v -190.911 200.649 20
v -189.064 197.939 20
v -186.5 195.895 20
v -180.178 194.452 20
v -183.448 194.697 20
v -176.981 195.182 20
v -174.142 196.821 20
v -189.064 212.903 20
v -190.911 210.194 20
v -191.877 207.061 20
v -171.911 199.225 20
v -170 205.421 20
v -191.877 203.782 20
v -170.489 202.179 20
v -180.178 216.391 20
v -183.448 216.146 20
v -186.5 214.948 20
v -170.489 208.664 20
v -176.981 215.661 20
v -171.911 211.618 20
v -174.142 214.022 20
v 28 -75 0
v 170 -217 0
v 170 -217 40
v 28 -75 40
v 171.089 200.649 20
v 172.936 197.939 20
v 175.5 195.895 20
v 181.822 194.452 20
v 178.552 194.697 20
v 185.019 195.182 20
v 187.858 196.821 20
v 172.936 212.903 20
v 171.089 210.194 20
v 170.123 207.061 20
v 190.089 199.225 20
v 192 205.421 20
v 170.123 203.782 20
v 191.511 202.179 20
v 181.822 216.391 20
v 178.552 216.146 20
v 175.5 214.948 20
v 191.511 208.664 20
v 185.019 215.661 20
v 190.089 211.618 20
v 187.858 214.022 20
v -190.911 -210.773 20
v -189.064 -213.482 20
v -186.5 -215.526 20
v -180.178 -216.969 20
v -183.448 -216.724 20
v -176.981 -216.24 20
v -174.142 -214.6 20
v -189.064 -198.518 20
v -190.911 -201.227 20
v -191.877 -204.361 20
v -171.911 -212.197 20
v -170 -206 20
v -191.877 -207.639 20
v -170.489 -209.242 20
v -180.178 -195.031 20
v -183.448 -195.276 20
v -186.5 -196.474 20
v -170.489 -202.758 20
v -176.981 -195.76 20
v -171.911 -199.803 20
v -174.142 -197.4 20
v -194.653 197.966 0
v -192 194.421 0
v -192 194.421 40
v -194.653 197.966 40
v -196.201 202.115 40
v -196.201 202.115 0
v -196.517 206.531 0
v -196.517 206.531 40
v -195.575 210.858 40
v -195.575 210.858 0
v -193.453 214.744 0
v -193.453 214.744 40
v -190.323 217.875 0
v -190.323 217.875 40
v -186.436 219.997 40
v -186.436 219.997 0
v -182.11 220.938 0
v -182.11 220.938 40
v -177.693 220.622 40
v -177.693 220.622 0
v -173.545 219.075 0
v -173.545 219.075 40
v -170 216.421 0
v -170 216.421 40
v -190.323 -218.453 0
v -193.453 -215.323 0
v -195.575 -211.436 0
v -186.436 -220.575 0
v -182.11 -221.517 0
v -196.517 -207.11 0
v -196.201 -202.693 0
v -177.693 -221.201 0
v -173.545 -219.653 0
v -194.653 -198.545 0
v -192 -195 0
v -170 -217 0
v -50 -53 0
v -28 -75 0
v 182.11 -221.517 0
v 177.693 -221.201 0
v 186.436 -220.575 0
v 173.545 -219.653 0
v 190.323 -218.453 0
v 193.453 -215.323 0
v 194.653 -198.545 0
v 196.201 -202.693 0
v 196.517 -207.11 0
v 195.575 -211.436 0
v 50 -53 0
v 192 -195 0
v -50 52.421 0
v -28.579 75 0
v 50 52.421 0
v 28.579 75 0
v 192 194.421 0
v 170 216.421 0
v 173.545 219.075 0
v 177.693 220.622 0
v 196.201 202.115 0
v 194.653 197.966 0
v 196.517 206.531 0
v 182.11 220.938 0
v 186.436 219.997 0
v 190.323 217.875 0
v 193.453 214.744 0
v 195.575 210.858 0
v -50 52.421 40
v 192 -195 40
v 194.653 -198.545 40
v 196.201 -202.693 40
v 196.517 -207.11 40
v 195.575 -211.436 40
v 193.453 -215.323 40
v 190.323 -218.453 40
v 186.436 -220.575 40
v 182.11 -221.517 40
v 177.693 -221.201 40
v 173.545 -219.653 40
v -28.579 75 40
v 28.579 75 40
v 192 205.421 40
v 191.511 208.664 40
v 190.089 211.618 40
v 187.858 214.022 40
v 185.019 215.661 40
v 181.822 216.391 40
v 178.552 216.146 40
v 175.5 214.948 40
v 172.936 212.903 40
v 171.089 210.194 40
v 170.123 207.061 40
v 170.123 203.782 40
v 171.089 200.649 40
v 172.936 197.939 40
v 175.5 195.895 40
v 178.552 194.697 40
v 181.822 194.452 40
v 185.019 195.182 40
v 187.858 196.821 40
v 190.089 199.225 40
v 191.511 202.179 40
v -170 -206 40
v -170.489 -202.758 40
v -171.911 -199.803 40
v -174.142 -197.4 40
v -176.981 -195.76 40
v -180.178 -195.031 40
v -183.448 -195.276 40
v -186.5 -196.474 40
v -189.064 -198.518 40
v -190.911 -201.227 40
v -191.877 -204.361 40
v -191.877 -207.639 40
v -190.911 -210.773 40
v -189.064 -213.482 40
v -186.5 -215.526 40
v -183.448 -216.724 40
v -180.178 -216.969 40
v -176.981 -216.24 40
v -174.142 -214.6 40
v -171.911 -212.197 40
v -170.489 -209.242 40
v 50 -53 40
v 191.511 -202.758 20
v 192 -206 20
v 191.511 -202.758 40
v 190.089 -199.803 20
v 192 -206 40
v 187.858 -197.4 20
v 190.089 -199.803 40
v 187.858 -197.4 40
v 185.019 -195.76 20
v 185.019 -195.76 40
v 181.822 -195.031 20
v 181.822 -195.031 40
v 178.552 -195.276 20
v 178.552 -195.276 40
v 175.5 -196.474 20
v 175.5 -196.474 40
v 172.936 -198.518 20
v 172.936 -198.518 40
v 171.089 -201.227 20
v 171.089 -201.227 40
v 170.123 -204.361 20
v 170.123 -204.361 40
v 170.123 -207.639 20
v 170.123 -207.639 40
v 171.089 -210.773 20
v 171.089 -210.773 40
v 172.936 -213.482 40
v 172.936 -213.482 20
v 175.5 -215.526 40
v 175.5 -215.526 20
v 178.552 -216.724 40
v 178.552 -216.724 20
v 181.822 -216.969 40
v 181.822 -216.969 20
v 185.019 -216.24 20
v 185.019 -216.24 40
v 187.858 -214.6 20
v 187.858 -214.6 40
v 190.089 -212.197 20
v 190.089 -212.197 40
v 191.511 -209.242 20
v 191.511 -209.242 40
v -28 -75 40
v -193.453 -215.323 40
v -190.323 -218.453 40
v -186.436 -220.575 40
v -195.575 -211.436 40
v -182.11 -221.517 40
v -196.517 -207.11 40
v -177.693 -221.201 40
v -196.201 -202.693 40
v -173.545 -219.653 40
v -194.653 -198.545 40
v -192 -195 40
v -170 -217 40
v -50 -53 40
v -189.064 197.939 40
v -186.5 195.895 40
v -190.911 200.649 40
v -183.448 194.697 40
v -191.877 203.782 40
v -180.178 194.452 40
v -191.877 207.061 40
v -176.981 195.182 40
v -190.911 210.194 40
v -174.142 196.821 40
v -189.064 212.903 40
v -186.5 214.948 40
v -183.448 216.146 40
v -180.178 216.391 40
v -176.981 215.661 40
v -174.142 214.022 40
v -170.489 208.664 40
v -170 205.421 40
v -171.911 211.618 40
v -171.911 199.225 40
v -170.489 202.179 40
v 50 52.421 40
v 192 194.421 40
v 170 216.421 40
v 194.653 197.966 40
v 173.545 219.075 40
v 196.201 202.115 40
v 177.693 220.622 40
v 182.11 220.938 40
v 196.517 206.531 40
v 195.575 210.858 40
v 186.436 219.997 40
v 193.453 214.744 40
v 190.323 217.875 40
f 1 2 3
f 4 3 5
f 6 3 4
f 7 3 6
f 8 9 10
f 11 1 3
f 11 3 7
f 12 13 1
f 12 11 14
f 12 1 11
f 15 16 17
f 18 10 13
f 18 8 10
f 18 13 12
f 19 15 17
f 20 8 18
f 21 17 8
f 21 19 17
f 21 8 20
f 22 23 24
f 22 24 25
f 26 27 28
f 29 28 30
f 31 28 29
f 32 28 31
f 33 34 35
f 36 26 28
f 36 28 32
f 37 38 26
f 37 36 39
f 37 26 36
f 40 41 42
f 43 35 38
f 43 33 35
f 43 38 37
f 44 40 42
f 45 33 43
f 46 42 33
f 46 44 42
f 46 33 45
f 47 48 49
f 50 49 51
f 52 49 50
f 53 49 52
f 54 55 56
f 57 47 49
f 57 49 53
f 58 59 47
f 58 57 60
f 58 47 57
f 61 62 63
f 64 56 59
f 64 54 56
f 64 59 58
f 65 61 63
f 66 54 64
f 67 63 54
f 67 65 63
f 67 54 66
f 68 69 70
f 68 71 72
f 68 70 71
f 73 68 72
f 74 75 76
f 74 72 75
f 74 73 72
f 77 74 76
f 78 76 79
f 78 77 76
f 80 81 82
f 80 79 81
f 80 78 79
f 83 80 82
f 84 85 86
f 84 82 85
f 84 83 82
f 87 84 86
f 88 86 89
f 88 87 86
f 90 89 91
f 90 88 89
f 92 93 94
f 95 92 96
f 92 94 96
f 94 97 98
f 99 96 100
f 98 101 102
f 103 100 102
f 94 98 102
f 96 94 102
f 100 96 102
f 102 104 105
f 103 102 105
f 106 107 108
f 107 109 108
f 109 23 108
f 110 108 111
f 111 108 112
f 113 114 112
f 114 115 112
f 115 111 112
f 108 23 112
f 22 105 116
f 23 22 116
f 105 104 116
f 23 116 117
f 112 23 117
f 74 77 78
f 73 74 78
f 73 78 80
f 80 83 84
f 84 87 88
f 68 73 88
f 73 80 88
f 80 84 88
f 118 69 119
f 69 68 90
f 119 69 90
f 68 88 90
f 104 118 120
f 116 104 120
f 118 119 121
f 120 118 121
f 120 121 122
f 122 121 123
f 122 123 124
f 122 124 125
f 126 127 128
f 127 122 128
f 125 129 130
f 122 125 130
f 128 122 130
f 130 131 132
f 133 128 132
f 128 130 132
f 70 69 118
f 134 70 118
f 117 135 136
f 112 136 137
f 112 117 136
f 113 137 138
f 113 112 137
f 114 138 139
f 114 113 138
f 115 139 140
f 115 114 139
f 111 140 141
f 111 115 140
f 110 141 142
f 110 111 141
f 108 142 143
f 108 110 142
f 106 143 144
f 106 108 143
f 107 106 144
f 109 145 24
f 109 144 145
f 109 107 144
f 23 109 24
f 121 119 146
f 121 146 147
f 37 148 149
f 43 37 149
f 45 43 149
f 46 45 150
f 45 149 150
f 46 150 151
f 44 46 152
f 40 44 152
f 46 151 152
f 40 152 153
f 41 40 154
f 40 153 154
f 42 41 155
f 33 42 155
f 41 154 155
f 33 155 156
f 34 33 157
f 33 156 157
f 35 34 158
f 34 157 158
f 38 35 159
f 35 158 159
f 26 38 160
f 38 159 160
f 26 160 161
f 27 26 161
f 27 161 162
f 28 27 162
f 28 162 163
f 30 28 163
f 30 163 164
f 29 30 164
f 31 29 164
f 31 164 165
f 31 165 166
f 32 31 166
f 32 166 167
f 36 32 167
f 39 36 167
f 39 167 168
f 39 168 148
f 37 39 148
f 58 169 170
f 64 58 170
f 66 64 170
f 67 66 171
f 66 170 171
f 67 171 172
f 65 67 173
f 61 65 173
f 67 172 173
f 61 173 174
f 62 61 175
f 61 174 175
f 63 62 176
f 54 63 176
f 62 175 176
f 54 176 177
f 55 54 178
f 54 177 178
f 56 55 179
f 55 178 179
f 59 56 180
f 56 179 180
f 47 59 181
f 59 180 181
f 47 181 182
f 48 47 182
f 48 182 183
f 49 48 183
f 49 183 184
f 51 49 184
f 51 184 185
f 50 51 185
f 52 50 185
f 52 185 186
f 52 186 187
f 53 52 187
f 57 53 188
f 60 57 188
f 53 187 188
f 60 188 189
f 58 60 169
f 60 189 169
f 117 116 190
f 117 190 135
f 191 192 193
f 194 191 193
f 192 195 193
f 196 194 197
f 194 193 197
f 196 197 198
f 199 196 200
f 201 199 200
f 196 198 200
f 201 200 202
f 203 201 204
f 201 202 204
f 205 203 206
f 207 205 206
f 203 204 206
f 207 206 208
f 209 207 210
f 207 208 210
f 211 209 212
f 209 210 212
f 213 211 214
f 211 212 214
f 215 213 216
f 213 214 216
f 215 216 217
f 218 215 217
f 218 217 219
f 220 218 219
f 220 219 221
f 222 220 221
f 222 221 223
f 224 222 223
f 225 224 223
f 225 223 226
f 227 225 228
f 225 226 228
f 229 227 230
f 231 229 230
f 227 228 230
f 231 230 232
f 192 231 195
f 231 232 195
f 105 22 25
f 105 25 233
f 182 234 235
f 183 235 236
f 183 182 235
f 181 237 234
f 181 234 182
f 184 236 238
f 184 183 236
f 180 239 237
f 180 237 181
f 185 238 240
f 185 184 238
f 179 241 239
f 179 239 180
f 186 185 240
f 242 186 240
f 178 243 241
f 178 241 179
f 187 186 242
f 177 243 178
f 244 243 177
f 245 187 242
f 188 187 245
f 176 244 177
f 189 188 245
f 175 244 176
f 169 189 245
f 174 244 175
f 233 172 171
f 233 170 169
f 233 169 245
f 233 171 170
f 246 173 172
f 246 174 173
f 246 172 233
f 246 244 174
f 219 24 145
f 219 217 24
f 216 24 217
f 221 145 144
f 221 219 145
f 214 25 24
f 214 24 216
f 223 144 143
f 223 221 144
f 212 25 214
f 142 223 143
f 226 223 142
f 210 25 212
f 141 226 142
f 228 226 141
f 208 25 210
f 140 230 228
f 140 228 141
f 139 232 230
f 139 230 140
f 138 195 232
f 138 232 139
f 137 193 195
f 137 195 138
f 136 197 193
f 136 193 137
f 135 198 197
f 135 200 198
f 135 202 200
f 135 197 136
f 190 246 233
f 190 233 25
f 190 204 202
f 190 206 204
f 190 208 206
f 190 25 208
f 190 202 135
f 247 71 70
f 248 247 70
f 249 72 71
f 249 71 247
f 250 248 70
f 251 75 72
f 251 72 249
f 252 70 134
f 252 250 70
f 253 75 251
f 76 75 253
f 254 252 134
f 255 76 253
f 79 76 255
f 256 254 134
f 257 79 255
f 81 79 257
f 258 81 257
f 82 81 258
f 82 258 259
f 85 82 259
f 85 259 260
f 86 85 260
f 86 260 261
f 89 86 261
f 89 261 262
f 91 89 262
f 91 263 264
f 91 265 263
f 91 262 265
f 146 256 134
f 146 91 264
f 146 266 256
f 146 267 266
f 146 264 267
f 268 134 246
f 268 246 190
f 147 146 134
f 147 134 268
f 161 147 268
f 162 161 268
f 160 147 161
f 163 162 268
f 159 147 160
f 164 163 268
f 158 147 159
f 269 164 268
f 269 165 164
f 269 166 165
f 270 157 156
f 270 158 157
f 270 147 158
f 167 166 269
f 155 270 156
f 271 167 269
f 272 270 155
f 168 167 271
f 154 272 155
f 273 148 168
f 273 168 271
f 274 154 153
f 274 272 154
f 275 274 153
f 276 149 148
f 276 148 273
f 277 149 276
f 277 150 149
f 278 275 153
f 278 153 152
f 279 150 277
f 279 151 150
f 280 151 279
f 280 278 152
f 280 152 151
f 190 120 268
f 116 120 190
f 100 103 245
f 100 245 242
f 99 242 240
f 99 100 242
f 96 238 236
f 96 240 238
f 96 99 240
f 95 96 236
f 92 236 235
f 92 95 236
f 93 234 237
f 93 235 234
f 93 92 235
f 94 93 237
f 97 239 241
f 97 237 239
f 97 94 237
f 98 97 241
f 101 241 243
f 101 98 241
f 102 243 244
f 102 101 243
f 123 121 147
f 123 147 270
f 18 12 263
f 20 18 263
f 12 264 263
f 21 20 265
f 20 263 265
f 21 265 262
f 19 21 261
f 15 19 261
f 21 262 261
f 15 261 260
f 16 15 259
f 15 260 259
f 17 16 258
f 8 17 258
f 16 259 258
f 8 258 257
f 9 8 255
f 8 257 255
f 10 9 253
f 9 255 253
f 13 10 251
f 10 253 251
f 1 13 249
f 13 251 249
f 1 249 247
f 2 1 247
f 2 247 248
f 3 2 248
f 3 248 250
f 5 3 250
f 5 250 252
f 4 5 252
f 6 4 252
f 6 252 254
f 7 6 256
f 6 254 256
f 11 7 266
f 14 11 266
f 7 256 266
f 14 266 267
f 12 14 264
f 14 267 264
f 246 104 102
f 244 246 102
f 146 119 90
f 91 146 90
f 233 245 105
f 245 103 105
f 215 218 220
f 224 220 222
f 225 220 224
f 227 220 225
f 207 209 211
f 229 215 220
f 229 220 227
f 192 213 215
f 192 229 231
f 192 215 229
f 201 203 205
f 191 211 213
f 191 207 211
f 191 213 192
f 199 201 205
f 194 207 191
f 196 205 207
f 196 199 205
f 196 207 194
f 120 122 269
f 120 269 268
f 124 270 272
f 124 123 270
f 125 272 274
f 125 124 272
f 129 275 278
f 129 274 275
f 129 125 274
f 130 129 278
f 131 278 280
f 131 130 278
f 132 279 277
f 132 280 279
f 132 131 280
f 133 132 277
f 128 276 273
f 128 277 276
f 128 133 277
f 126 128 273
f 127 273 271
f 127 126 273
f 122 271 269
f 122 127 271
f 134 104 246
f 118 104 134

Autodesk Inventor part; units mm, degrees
ref_plane "YZ Plane" through (0, 0, 0) normal (1, 0, 0) x (0, 1, 0)
ref_plane "XZ Plane" through (0, 0, 0) normal (0, 1, 0) x (-1, 0, 0)
ref_plane "XY Plane" through (0, 0, 0) normal (0, 0, 1) x (1, 0, 0)
sketch "Skizze2" plane through (0, 0, 0) normal (0, 0, 1) x (1, 0, 0)
  line L0 (-50, 75) -> (50, 75)
  line L1 (50, 75) -> (50, -75)
  line L2 (50, -75) -> (-50, -75)
  line L3 (-50, -75) -> (-50, 75)
  line L4 (-28.5786, 75) -> (-170, 216.4214)
  line L5 (-170, 216.4214) -> (-192, 194.4214)
  line L6 (-192, 194.4214) -> (-50, 52.4214)
  circle A0 centre (-181, 205.4214) radius 15.5563
  line L7 (28.5786, 75) -> (170, 216.4214)
  line L8 (170, 216.4214) -> (192, 194.4214)
  line L9 (192, 194.4214) -> (50, 52.4214)
  line L10 (50, -53) -> (192, -195)
  line L11 (192, -195) -> (170, -217)
  line L12 (170, -217) -> (28, -75)
  line L13 (-50, -53) -> (-192, -195)
  line L14 (-192, -195) -> (-170, -217)
  line L15 (-170, -217) -> (-28, -75)
  circle A1 centre (181, -206) radius 15.5563
  circle A2 centre (181, 205.4214) radius 15.5563
  circle A3 centre (-181, -206) radius 15.5563
  point P0 (0, 0)
  point P1 (50, 0)
  point P2 (0, 75)
  dimension "d0" = 150
  dimension "d1" = 100
  dimension "d2" = 135
  dimension "d4" = 22
  dimension "d6" = 200
  dimension "d7" = 120
  dimension "d8" = 31.1127
  dimension "d9" = 135
  dimension "d10" = 0
  dimension "d12" = 22
  dimension "d14" = 200
  dimension "d15" = 120
  dimension "d16" = 135
  dimension "d17" = 22
  dimension "d20" = 120
  dimension "d21" = 120
  dimension "d22" = 22
  dimension "d23" = 120
  dimension "d24" = 135
  dimension "d25" = 120
extrude "Extrusion1" add sketch "Skizze2" along normal blind 40
sketch "Skizze3" plane through (0, 0, 40) normal (0, 0, 1) x (1, 0, 0)
  arc A0 (-170, 216.4214) -> (-192, 194.4214) centre (-181, 205.4214) ccw projected
  circle A1 centre (-181, 205.4214) radius 11
  arc A2 (192, 194.4214) -> (170, 216.4214) centre (181, 205.4214) ccw projected
  circle A3 centre (181, 205.4214) radius 11
  arc A4 (170, -217) -> (192, -195) centre (181, -206) ccw projected
  circle A5 centre (181, -206) radius 11
  arc A6 (-192, -195) -> (-170, -217) centre (-181, -206) ccw projected
  circle A7 centre (-181, -206) radius 11
  point P0 (0, 0)
  dimension "d28" = 22
  dimension "d29" = 22
  dimension "d30" = 22
  dimension "d31" = 22
extrude "Extrusion2" cut sketch "Skizze3" against normal blind 20
sketch "Skizze4" plane through (0, 0, 40) normal (0, 0, 1) x (1, 0, 0)
  point P0 (0, 0)
properties part number "DrohneSkizze"
